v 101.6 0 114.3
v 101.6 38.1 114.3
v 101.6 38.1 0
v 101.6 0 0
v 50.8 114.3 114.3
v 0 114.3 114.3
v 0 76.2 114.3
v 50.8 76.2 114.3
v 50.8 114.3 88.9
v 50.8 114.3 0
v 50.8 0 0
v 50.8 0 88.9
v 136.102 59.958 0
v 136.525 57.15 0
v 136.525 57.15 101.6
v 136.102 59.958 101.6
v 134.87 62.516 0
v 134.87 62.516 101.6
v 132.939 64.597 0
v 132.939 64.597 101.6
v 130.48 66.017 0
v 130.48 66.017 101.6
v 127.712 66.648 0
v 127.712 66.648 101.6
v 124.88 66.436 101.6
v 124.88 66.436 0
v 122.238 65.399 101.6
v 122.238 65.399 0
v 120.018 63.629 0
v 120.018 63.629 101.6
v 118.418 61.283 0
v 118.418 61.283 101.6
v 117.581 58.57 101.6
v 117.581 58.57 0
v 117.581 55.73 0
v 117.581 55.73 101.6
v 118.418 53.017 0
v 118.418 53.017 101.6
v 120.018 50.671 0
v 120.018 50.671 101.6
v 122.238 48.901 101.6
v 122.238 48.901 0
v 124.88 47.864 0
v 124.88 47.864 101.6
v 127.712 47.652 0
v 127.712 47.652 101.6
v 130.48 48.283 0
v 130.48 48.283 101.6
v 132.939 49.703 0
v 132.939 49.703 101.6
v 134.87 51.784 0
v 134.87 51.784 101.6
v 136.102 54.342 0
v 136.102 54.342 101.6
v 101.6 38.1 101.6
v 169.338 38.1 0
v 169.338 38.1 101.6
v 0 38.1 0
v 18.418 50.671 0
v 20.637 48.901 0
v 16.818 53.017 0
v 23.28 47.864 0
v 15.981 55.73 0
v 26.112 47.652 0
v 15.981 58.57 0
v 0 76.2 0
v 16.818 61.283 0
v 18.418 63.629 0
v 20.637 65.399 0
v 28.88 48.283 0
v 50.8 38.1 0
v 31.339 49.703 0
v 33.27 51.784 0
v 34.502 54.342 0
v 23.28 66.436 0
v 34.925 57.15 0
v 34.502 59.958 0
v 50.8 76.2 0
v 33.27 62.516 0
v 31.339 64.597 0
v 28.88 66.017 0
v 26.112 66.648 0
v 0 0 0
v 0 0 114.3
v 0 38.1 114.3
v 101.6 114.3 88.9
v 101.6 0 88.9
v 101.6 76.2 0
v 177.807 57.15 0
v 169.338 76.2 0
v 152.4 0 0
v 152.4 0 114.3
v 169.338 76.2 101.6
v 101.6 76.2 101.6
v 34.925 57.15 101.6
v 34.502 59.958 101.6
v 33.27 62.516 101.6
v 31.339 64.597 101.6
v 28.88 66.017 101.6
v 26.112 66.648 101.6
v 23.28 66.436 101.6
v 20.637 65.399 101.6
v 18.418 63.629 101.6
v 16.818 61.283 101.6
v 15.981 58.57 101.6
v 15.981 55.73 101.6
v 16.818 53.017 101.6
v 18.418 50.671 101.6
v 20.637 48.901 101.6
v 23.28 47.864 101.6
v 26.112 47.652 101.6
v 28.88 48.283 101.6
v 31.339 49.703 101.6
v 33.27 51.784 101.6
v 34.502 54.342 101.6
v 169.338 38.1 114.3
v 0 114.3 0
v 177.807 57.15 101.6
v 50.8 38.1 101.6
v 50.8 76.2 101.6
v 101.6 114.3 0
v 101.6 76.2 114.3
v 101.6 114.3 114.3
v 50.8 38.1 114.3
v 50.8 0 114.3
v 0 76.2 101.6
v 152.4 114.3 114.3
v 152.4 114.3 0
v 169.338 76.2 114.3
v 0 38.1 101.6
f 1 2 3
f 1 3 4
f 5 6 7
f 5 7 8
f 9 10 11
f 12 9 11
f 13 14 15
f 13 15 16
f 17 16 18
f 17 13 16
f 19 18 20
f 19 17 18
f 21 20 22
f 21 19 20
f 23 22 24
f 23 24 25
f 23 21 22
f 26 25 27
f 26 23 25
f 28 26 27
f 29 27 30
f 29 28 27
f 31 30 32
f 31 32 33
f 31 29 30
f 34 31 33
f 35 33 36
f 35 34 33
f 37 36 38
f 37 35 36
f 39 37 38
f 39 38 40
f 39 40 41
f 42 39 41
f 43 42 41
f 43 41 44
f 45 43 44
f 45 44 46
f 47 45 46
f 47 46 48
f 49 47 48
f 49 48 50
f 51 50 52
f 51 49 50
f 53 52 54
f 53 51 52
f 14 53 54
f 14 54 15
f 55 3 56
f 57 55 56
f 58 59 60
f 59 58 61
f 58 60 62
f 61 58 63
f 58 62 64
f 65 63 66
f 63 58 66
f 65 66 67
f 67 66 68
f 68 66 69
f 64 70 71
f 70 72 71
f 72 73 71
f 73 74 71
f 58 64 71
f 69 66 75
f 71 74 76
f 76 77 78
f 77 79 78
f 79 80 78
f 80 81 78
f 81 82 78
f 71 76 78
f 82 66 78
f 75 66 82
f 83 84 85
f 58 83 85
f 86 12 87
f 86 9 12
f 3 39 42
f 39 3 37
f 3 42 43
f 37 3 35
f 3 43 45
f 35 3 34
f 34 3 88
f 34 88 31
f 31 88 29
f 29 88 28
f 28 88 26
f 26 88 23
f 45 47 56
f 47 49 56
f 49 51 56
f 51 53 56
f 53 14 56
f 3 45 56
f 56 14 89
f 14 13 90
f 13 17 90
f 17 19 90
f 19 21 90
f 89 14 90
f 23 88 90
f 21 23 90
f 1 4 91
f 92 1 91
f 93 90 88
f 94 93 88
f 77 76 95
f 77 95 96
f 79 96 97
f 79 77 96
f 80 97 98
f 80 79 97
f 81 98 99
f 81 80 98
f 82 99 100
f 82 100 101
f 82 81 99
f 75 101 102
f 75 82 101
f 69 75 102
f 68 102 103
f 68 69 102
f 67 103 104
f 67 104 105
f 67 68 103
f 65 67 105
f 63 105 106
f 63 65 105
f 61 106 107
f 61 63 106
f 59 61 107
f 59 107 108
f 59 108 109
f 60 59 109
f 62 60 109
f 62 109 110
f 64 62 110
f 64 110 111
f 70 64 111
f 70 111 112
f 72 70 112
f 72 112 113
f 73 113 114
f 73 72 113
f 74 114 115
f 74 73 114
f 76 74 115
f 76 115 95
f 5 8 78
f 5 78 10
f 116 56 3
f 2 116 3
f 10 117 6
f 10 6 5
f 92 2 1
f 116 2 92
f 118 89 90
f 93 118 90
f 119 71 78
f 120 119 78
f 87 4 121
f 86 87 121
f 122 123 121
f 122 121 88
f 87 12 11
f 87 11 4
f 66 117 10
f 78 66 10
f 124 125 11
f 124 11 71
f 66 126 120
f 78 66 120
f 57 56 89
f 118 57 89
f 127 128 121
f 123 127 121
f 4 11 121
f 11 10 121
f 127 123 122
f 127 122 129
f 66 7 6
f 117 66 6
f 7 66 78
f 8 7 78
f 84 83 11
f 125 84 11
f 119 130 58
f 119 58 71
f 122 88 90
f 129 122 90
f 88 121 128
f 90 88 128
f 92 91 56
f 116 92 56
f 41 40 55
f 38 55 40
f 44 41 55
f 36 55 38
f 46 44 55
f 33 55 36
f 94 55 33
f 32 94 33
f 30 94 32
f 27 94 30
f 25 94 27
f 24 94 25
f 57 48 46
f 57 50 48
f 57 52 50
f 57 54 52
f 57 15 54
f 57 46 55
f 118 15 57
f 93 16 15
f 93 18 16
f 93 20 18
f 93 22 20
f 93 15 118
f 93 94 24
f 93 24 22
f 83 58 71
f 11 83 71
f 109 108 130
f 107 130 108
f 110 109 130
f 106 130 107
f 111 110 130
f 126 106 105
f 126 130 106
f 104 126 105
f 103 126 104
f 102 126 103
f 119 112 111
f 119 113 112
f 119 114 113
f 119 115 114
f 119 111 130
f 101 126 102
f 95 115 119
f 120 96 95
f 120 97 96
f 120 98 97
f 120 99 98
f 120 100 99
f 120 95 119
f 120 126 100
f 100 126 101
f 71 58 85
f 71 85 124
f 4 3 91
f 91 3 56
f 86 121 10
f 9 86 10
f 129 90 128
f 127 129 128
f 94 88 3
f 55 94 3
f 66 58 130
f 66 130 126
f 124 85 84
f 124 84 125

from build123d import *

# Parameters (mm, degrees)
F0_W     = 50.8
F0_H     = 38.1
F1_DEPTH = 114.3
F2_DEPTH = 88.9
F0_R     = 9.525
F3_DEPTH = 101.6


with BuildPart() as f1:
    # F0 (on Top) → F1 (new body)
    with BuildSketch(Plane.XY):
        with Locations((25.4, 19.05)):
            Rectangle(F0_W, F0_H)
        Polygon((101.6, 0), (152.4, 0), (169.337734, 38.1), (152.4, 38.1), (101.6, 38.1), align=None)
        Polygon((101.6, 114.3), (101.6, 76.2), (152.4, 76.2), (169.337734, 76.2), (152.4, 114.3), align=None)
        with Locations((25.4, 95.25)):
            Rectangle(F0_W, F0_H)
    extrude(amount=F1_DEPTH)


with BuildPart() as f2:
    # F0 (on Top) → F2 (new body)
    with BuildSketch(Plane.XY):
        Polygon((50.8, 0), (101.6, 0), (101.6, 38.1), (101.6, 76.2), (101.6, 114.3), (50.8, 114.3), (50.8, 76.2), (50.8, 38.1), align=None)
    extrude(amount=F2_DEPTH)


with BuildPart() as f3:
    # F0 (on Top) → F3 (new body)
    with BuildSketch(Plane.XY):
        with Locations((25.4, 57.15)):
            Rectangle(F0_W, F0_H)
        with Locations((25.4, 57.15)):
            Circle(F0_R, mode=Mode.SUBTRACT)
        Polygon((152.4, 38.1), (169.337734, 38.1), (177.806601, 57.15), (169.337734, 76.2), (152.4, 76.2), (101.6, 76.2), (101.6, 38.1), align=None)
        with Locations((127, 57.15)):
            Circle(F0_R, mode=Mode.SUBTRACT)
    extrude(amount=F3_DEPTH)


solid = Compound([f1.part, f2.part, f3.part])
